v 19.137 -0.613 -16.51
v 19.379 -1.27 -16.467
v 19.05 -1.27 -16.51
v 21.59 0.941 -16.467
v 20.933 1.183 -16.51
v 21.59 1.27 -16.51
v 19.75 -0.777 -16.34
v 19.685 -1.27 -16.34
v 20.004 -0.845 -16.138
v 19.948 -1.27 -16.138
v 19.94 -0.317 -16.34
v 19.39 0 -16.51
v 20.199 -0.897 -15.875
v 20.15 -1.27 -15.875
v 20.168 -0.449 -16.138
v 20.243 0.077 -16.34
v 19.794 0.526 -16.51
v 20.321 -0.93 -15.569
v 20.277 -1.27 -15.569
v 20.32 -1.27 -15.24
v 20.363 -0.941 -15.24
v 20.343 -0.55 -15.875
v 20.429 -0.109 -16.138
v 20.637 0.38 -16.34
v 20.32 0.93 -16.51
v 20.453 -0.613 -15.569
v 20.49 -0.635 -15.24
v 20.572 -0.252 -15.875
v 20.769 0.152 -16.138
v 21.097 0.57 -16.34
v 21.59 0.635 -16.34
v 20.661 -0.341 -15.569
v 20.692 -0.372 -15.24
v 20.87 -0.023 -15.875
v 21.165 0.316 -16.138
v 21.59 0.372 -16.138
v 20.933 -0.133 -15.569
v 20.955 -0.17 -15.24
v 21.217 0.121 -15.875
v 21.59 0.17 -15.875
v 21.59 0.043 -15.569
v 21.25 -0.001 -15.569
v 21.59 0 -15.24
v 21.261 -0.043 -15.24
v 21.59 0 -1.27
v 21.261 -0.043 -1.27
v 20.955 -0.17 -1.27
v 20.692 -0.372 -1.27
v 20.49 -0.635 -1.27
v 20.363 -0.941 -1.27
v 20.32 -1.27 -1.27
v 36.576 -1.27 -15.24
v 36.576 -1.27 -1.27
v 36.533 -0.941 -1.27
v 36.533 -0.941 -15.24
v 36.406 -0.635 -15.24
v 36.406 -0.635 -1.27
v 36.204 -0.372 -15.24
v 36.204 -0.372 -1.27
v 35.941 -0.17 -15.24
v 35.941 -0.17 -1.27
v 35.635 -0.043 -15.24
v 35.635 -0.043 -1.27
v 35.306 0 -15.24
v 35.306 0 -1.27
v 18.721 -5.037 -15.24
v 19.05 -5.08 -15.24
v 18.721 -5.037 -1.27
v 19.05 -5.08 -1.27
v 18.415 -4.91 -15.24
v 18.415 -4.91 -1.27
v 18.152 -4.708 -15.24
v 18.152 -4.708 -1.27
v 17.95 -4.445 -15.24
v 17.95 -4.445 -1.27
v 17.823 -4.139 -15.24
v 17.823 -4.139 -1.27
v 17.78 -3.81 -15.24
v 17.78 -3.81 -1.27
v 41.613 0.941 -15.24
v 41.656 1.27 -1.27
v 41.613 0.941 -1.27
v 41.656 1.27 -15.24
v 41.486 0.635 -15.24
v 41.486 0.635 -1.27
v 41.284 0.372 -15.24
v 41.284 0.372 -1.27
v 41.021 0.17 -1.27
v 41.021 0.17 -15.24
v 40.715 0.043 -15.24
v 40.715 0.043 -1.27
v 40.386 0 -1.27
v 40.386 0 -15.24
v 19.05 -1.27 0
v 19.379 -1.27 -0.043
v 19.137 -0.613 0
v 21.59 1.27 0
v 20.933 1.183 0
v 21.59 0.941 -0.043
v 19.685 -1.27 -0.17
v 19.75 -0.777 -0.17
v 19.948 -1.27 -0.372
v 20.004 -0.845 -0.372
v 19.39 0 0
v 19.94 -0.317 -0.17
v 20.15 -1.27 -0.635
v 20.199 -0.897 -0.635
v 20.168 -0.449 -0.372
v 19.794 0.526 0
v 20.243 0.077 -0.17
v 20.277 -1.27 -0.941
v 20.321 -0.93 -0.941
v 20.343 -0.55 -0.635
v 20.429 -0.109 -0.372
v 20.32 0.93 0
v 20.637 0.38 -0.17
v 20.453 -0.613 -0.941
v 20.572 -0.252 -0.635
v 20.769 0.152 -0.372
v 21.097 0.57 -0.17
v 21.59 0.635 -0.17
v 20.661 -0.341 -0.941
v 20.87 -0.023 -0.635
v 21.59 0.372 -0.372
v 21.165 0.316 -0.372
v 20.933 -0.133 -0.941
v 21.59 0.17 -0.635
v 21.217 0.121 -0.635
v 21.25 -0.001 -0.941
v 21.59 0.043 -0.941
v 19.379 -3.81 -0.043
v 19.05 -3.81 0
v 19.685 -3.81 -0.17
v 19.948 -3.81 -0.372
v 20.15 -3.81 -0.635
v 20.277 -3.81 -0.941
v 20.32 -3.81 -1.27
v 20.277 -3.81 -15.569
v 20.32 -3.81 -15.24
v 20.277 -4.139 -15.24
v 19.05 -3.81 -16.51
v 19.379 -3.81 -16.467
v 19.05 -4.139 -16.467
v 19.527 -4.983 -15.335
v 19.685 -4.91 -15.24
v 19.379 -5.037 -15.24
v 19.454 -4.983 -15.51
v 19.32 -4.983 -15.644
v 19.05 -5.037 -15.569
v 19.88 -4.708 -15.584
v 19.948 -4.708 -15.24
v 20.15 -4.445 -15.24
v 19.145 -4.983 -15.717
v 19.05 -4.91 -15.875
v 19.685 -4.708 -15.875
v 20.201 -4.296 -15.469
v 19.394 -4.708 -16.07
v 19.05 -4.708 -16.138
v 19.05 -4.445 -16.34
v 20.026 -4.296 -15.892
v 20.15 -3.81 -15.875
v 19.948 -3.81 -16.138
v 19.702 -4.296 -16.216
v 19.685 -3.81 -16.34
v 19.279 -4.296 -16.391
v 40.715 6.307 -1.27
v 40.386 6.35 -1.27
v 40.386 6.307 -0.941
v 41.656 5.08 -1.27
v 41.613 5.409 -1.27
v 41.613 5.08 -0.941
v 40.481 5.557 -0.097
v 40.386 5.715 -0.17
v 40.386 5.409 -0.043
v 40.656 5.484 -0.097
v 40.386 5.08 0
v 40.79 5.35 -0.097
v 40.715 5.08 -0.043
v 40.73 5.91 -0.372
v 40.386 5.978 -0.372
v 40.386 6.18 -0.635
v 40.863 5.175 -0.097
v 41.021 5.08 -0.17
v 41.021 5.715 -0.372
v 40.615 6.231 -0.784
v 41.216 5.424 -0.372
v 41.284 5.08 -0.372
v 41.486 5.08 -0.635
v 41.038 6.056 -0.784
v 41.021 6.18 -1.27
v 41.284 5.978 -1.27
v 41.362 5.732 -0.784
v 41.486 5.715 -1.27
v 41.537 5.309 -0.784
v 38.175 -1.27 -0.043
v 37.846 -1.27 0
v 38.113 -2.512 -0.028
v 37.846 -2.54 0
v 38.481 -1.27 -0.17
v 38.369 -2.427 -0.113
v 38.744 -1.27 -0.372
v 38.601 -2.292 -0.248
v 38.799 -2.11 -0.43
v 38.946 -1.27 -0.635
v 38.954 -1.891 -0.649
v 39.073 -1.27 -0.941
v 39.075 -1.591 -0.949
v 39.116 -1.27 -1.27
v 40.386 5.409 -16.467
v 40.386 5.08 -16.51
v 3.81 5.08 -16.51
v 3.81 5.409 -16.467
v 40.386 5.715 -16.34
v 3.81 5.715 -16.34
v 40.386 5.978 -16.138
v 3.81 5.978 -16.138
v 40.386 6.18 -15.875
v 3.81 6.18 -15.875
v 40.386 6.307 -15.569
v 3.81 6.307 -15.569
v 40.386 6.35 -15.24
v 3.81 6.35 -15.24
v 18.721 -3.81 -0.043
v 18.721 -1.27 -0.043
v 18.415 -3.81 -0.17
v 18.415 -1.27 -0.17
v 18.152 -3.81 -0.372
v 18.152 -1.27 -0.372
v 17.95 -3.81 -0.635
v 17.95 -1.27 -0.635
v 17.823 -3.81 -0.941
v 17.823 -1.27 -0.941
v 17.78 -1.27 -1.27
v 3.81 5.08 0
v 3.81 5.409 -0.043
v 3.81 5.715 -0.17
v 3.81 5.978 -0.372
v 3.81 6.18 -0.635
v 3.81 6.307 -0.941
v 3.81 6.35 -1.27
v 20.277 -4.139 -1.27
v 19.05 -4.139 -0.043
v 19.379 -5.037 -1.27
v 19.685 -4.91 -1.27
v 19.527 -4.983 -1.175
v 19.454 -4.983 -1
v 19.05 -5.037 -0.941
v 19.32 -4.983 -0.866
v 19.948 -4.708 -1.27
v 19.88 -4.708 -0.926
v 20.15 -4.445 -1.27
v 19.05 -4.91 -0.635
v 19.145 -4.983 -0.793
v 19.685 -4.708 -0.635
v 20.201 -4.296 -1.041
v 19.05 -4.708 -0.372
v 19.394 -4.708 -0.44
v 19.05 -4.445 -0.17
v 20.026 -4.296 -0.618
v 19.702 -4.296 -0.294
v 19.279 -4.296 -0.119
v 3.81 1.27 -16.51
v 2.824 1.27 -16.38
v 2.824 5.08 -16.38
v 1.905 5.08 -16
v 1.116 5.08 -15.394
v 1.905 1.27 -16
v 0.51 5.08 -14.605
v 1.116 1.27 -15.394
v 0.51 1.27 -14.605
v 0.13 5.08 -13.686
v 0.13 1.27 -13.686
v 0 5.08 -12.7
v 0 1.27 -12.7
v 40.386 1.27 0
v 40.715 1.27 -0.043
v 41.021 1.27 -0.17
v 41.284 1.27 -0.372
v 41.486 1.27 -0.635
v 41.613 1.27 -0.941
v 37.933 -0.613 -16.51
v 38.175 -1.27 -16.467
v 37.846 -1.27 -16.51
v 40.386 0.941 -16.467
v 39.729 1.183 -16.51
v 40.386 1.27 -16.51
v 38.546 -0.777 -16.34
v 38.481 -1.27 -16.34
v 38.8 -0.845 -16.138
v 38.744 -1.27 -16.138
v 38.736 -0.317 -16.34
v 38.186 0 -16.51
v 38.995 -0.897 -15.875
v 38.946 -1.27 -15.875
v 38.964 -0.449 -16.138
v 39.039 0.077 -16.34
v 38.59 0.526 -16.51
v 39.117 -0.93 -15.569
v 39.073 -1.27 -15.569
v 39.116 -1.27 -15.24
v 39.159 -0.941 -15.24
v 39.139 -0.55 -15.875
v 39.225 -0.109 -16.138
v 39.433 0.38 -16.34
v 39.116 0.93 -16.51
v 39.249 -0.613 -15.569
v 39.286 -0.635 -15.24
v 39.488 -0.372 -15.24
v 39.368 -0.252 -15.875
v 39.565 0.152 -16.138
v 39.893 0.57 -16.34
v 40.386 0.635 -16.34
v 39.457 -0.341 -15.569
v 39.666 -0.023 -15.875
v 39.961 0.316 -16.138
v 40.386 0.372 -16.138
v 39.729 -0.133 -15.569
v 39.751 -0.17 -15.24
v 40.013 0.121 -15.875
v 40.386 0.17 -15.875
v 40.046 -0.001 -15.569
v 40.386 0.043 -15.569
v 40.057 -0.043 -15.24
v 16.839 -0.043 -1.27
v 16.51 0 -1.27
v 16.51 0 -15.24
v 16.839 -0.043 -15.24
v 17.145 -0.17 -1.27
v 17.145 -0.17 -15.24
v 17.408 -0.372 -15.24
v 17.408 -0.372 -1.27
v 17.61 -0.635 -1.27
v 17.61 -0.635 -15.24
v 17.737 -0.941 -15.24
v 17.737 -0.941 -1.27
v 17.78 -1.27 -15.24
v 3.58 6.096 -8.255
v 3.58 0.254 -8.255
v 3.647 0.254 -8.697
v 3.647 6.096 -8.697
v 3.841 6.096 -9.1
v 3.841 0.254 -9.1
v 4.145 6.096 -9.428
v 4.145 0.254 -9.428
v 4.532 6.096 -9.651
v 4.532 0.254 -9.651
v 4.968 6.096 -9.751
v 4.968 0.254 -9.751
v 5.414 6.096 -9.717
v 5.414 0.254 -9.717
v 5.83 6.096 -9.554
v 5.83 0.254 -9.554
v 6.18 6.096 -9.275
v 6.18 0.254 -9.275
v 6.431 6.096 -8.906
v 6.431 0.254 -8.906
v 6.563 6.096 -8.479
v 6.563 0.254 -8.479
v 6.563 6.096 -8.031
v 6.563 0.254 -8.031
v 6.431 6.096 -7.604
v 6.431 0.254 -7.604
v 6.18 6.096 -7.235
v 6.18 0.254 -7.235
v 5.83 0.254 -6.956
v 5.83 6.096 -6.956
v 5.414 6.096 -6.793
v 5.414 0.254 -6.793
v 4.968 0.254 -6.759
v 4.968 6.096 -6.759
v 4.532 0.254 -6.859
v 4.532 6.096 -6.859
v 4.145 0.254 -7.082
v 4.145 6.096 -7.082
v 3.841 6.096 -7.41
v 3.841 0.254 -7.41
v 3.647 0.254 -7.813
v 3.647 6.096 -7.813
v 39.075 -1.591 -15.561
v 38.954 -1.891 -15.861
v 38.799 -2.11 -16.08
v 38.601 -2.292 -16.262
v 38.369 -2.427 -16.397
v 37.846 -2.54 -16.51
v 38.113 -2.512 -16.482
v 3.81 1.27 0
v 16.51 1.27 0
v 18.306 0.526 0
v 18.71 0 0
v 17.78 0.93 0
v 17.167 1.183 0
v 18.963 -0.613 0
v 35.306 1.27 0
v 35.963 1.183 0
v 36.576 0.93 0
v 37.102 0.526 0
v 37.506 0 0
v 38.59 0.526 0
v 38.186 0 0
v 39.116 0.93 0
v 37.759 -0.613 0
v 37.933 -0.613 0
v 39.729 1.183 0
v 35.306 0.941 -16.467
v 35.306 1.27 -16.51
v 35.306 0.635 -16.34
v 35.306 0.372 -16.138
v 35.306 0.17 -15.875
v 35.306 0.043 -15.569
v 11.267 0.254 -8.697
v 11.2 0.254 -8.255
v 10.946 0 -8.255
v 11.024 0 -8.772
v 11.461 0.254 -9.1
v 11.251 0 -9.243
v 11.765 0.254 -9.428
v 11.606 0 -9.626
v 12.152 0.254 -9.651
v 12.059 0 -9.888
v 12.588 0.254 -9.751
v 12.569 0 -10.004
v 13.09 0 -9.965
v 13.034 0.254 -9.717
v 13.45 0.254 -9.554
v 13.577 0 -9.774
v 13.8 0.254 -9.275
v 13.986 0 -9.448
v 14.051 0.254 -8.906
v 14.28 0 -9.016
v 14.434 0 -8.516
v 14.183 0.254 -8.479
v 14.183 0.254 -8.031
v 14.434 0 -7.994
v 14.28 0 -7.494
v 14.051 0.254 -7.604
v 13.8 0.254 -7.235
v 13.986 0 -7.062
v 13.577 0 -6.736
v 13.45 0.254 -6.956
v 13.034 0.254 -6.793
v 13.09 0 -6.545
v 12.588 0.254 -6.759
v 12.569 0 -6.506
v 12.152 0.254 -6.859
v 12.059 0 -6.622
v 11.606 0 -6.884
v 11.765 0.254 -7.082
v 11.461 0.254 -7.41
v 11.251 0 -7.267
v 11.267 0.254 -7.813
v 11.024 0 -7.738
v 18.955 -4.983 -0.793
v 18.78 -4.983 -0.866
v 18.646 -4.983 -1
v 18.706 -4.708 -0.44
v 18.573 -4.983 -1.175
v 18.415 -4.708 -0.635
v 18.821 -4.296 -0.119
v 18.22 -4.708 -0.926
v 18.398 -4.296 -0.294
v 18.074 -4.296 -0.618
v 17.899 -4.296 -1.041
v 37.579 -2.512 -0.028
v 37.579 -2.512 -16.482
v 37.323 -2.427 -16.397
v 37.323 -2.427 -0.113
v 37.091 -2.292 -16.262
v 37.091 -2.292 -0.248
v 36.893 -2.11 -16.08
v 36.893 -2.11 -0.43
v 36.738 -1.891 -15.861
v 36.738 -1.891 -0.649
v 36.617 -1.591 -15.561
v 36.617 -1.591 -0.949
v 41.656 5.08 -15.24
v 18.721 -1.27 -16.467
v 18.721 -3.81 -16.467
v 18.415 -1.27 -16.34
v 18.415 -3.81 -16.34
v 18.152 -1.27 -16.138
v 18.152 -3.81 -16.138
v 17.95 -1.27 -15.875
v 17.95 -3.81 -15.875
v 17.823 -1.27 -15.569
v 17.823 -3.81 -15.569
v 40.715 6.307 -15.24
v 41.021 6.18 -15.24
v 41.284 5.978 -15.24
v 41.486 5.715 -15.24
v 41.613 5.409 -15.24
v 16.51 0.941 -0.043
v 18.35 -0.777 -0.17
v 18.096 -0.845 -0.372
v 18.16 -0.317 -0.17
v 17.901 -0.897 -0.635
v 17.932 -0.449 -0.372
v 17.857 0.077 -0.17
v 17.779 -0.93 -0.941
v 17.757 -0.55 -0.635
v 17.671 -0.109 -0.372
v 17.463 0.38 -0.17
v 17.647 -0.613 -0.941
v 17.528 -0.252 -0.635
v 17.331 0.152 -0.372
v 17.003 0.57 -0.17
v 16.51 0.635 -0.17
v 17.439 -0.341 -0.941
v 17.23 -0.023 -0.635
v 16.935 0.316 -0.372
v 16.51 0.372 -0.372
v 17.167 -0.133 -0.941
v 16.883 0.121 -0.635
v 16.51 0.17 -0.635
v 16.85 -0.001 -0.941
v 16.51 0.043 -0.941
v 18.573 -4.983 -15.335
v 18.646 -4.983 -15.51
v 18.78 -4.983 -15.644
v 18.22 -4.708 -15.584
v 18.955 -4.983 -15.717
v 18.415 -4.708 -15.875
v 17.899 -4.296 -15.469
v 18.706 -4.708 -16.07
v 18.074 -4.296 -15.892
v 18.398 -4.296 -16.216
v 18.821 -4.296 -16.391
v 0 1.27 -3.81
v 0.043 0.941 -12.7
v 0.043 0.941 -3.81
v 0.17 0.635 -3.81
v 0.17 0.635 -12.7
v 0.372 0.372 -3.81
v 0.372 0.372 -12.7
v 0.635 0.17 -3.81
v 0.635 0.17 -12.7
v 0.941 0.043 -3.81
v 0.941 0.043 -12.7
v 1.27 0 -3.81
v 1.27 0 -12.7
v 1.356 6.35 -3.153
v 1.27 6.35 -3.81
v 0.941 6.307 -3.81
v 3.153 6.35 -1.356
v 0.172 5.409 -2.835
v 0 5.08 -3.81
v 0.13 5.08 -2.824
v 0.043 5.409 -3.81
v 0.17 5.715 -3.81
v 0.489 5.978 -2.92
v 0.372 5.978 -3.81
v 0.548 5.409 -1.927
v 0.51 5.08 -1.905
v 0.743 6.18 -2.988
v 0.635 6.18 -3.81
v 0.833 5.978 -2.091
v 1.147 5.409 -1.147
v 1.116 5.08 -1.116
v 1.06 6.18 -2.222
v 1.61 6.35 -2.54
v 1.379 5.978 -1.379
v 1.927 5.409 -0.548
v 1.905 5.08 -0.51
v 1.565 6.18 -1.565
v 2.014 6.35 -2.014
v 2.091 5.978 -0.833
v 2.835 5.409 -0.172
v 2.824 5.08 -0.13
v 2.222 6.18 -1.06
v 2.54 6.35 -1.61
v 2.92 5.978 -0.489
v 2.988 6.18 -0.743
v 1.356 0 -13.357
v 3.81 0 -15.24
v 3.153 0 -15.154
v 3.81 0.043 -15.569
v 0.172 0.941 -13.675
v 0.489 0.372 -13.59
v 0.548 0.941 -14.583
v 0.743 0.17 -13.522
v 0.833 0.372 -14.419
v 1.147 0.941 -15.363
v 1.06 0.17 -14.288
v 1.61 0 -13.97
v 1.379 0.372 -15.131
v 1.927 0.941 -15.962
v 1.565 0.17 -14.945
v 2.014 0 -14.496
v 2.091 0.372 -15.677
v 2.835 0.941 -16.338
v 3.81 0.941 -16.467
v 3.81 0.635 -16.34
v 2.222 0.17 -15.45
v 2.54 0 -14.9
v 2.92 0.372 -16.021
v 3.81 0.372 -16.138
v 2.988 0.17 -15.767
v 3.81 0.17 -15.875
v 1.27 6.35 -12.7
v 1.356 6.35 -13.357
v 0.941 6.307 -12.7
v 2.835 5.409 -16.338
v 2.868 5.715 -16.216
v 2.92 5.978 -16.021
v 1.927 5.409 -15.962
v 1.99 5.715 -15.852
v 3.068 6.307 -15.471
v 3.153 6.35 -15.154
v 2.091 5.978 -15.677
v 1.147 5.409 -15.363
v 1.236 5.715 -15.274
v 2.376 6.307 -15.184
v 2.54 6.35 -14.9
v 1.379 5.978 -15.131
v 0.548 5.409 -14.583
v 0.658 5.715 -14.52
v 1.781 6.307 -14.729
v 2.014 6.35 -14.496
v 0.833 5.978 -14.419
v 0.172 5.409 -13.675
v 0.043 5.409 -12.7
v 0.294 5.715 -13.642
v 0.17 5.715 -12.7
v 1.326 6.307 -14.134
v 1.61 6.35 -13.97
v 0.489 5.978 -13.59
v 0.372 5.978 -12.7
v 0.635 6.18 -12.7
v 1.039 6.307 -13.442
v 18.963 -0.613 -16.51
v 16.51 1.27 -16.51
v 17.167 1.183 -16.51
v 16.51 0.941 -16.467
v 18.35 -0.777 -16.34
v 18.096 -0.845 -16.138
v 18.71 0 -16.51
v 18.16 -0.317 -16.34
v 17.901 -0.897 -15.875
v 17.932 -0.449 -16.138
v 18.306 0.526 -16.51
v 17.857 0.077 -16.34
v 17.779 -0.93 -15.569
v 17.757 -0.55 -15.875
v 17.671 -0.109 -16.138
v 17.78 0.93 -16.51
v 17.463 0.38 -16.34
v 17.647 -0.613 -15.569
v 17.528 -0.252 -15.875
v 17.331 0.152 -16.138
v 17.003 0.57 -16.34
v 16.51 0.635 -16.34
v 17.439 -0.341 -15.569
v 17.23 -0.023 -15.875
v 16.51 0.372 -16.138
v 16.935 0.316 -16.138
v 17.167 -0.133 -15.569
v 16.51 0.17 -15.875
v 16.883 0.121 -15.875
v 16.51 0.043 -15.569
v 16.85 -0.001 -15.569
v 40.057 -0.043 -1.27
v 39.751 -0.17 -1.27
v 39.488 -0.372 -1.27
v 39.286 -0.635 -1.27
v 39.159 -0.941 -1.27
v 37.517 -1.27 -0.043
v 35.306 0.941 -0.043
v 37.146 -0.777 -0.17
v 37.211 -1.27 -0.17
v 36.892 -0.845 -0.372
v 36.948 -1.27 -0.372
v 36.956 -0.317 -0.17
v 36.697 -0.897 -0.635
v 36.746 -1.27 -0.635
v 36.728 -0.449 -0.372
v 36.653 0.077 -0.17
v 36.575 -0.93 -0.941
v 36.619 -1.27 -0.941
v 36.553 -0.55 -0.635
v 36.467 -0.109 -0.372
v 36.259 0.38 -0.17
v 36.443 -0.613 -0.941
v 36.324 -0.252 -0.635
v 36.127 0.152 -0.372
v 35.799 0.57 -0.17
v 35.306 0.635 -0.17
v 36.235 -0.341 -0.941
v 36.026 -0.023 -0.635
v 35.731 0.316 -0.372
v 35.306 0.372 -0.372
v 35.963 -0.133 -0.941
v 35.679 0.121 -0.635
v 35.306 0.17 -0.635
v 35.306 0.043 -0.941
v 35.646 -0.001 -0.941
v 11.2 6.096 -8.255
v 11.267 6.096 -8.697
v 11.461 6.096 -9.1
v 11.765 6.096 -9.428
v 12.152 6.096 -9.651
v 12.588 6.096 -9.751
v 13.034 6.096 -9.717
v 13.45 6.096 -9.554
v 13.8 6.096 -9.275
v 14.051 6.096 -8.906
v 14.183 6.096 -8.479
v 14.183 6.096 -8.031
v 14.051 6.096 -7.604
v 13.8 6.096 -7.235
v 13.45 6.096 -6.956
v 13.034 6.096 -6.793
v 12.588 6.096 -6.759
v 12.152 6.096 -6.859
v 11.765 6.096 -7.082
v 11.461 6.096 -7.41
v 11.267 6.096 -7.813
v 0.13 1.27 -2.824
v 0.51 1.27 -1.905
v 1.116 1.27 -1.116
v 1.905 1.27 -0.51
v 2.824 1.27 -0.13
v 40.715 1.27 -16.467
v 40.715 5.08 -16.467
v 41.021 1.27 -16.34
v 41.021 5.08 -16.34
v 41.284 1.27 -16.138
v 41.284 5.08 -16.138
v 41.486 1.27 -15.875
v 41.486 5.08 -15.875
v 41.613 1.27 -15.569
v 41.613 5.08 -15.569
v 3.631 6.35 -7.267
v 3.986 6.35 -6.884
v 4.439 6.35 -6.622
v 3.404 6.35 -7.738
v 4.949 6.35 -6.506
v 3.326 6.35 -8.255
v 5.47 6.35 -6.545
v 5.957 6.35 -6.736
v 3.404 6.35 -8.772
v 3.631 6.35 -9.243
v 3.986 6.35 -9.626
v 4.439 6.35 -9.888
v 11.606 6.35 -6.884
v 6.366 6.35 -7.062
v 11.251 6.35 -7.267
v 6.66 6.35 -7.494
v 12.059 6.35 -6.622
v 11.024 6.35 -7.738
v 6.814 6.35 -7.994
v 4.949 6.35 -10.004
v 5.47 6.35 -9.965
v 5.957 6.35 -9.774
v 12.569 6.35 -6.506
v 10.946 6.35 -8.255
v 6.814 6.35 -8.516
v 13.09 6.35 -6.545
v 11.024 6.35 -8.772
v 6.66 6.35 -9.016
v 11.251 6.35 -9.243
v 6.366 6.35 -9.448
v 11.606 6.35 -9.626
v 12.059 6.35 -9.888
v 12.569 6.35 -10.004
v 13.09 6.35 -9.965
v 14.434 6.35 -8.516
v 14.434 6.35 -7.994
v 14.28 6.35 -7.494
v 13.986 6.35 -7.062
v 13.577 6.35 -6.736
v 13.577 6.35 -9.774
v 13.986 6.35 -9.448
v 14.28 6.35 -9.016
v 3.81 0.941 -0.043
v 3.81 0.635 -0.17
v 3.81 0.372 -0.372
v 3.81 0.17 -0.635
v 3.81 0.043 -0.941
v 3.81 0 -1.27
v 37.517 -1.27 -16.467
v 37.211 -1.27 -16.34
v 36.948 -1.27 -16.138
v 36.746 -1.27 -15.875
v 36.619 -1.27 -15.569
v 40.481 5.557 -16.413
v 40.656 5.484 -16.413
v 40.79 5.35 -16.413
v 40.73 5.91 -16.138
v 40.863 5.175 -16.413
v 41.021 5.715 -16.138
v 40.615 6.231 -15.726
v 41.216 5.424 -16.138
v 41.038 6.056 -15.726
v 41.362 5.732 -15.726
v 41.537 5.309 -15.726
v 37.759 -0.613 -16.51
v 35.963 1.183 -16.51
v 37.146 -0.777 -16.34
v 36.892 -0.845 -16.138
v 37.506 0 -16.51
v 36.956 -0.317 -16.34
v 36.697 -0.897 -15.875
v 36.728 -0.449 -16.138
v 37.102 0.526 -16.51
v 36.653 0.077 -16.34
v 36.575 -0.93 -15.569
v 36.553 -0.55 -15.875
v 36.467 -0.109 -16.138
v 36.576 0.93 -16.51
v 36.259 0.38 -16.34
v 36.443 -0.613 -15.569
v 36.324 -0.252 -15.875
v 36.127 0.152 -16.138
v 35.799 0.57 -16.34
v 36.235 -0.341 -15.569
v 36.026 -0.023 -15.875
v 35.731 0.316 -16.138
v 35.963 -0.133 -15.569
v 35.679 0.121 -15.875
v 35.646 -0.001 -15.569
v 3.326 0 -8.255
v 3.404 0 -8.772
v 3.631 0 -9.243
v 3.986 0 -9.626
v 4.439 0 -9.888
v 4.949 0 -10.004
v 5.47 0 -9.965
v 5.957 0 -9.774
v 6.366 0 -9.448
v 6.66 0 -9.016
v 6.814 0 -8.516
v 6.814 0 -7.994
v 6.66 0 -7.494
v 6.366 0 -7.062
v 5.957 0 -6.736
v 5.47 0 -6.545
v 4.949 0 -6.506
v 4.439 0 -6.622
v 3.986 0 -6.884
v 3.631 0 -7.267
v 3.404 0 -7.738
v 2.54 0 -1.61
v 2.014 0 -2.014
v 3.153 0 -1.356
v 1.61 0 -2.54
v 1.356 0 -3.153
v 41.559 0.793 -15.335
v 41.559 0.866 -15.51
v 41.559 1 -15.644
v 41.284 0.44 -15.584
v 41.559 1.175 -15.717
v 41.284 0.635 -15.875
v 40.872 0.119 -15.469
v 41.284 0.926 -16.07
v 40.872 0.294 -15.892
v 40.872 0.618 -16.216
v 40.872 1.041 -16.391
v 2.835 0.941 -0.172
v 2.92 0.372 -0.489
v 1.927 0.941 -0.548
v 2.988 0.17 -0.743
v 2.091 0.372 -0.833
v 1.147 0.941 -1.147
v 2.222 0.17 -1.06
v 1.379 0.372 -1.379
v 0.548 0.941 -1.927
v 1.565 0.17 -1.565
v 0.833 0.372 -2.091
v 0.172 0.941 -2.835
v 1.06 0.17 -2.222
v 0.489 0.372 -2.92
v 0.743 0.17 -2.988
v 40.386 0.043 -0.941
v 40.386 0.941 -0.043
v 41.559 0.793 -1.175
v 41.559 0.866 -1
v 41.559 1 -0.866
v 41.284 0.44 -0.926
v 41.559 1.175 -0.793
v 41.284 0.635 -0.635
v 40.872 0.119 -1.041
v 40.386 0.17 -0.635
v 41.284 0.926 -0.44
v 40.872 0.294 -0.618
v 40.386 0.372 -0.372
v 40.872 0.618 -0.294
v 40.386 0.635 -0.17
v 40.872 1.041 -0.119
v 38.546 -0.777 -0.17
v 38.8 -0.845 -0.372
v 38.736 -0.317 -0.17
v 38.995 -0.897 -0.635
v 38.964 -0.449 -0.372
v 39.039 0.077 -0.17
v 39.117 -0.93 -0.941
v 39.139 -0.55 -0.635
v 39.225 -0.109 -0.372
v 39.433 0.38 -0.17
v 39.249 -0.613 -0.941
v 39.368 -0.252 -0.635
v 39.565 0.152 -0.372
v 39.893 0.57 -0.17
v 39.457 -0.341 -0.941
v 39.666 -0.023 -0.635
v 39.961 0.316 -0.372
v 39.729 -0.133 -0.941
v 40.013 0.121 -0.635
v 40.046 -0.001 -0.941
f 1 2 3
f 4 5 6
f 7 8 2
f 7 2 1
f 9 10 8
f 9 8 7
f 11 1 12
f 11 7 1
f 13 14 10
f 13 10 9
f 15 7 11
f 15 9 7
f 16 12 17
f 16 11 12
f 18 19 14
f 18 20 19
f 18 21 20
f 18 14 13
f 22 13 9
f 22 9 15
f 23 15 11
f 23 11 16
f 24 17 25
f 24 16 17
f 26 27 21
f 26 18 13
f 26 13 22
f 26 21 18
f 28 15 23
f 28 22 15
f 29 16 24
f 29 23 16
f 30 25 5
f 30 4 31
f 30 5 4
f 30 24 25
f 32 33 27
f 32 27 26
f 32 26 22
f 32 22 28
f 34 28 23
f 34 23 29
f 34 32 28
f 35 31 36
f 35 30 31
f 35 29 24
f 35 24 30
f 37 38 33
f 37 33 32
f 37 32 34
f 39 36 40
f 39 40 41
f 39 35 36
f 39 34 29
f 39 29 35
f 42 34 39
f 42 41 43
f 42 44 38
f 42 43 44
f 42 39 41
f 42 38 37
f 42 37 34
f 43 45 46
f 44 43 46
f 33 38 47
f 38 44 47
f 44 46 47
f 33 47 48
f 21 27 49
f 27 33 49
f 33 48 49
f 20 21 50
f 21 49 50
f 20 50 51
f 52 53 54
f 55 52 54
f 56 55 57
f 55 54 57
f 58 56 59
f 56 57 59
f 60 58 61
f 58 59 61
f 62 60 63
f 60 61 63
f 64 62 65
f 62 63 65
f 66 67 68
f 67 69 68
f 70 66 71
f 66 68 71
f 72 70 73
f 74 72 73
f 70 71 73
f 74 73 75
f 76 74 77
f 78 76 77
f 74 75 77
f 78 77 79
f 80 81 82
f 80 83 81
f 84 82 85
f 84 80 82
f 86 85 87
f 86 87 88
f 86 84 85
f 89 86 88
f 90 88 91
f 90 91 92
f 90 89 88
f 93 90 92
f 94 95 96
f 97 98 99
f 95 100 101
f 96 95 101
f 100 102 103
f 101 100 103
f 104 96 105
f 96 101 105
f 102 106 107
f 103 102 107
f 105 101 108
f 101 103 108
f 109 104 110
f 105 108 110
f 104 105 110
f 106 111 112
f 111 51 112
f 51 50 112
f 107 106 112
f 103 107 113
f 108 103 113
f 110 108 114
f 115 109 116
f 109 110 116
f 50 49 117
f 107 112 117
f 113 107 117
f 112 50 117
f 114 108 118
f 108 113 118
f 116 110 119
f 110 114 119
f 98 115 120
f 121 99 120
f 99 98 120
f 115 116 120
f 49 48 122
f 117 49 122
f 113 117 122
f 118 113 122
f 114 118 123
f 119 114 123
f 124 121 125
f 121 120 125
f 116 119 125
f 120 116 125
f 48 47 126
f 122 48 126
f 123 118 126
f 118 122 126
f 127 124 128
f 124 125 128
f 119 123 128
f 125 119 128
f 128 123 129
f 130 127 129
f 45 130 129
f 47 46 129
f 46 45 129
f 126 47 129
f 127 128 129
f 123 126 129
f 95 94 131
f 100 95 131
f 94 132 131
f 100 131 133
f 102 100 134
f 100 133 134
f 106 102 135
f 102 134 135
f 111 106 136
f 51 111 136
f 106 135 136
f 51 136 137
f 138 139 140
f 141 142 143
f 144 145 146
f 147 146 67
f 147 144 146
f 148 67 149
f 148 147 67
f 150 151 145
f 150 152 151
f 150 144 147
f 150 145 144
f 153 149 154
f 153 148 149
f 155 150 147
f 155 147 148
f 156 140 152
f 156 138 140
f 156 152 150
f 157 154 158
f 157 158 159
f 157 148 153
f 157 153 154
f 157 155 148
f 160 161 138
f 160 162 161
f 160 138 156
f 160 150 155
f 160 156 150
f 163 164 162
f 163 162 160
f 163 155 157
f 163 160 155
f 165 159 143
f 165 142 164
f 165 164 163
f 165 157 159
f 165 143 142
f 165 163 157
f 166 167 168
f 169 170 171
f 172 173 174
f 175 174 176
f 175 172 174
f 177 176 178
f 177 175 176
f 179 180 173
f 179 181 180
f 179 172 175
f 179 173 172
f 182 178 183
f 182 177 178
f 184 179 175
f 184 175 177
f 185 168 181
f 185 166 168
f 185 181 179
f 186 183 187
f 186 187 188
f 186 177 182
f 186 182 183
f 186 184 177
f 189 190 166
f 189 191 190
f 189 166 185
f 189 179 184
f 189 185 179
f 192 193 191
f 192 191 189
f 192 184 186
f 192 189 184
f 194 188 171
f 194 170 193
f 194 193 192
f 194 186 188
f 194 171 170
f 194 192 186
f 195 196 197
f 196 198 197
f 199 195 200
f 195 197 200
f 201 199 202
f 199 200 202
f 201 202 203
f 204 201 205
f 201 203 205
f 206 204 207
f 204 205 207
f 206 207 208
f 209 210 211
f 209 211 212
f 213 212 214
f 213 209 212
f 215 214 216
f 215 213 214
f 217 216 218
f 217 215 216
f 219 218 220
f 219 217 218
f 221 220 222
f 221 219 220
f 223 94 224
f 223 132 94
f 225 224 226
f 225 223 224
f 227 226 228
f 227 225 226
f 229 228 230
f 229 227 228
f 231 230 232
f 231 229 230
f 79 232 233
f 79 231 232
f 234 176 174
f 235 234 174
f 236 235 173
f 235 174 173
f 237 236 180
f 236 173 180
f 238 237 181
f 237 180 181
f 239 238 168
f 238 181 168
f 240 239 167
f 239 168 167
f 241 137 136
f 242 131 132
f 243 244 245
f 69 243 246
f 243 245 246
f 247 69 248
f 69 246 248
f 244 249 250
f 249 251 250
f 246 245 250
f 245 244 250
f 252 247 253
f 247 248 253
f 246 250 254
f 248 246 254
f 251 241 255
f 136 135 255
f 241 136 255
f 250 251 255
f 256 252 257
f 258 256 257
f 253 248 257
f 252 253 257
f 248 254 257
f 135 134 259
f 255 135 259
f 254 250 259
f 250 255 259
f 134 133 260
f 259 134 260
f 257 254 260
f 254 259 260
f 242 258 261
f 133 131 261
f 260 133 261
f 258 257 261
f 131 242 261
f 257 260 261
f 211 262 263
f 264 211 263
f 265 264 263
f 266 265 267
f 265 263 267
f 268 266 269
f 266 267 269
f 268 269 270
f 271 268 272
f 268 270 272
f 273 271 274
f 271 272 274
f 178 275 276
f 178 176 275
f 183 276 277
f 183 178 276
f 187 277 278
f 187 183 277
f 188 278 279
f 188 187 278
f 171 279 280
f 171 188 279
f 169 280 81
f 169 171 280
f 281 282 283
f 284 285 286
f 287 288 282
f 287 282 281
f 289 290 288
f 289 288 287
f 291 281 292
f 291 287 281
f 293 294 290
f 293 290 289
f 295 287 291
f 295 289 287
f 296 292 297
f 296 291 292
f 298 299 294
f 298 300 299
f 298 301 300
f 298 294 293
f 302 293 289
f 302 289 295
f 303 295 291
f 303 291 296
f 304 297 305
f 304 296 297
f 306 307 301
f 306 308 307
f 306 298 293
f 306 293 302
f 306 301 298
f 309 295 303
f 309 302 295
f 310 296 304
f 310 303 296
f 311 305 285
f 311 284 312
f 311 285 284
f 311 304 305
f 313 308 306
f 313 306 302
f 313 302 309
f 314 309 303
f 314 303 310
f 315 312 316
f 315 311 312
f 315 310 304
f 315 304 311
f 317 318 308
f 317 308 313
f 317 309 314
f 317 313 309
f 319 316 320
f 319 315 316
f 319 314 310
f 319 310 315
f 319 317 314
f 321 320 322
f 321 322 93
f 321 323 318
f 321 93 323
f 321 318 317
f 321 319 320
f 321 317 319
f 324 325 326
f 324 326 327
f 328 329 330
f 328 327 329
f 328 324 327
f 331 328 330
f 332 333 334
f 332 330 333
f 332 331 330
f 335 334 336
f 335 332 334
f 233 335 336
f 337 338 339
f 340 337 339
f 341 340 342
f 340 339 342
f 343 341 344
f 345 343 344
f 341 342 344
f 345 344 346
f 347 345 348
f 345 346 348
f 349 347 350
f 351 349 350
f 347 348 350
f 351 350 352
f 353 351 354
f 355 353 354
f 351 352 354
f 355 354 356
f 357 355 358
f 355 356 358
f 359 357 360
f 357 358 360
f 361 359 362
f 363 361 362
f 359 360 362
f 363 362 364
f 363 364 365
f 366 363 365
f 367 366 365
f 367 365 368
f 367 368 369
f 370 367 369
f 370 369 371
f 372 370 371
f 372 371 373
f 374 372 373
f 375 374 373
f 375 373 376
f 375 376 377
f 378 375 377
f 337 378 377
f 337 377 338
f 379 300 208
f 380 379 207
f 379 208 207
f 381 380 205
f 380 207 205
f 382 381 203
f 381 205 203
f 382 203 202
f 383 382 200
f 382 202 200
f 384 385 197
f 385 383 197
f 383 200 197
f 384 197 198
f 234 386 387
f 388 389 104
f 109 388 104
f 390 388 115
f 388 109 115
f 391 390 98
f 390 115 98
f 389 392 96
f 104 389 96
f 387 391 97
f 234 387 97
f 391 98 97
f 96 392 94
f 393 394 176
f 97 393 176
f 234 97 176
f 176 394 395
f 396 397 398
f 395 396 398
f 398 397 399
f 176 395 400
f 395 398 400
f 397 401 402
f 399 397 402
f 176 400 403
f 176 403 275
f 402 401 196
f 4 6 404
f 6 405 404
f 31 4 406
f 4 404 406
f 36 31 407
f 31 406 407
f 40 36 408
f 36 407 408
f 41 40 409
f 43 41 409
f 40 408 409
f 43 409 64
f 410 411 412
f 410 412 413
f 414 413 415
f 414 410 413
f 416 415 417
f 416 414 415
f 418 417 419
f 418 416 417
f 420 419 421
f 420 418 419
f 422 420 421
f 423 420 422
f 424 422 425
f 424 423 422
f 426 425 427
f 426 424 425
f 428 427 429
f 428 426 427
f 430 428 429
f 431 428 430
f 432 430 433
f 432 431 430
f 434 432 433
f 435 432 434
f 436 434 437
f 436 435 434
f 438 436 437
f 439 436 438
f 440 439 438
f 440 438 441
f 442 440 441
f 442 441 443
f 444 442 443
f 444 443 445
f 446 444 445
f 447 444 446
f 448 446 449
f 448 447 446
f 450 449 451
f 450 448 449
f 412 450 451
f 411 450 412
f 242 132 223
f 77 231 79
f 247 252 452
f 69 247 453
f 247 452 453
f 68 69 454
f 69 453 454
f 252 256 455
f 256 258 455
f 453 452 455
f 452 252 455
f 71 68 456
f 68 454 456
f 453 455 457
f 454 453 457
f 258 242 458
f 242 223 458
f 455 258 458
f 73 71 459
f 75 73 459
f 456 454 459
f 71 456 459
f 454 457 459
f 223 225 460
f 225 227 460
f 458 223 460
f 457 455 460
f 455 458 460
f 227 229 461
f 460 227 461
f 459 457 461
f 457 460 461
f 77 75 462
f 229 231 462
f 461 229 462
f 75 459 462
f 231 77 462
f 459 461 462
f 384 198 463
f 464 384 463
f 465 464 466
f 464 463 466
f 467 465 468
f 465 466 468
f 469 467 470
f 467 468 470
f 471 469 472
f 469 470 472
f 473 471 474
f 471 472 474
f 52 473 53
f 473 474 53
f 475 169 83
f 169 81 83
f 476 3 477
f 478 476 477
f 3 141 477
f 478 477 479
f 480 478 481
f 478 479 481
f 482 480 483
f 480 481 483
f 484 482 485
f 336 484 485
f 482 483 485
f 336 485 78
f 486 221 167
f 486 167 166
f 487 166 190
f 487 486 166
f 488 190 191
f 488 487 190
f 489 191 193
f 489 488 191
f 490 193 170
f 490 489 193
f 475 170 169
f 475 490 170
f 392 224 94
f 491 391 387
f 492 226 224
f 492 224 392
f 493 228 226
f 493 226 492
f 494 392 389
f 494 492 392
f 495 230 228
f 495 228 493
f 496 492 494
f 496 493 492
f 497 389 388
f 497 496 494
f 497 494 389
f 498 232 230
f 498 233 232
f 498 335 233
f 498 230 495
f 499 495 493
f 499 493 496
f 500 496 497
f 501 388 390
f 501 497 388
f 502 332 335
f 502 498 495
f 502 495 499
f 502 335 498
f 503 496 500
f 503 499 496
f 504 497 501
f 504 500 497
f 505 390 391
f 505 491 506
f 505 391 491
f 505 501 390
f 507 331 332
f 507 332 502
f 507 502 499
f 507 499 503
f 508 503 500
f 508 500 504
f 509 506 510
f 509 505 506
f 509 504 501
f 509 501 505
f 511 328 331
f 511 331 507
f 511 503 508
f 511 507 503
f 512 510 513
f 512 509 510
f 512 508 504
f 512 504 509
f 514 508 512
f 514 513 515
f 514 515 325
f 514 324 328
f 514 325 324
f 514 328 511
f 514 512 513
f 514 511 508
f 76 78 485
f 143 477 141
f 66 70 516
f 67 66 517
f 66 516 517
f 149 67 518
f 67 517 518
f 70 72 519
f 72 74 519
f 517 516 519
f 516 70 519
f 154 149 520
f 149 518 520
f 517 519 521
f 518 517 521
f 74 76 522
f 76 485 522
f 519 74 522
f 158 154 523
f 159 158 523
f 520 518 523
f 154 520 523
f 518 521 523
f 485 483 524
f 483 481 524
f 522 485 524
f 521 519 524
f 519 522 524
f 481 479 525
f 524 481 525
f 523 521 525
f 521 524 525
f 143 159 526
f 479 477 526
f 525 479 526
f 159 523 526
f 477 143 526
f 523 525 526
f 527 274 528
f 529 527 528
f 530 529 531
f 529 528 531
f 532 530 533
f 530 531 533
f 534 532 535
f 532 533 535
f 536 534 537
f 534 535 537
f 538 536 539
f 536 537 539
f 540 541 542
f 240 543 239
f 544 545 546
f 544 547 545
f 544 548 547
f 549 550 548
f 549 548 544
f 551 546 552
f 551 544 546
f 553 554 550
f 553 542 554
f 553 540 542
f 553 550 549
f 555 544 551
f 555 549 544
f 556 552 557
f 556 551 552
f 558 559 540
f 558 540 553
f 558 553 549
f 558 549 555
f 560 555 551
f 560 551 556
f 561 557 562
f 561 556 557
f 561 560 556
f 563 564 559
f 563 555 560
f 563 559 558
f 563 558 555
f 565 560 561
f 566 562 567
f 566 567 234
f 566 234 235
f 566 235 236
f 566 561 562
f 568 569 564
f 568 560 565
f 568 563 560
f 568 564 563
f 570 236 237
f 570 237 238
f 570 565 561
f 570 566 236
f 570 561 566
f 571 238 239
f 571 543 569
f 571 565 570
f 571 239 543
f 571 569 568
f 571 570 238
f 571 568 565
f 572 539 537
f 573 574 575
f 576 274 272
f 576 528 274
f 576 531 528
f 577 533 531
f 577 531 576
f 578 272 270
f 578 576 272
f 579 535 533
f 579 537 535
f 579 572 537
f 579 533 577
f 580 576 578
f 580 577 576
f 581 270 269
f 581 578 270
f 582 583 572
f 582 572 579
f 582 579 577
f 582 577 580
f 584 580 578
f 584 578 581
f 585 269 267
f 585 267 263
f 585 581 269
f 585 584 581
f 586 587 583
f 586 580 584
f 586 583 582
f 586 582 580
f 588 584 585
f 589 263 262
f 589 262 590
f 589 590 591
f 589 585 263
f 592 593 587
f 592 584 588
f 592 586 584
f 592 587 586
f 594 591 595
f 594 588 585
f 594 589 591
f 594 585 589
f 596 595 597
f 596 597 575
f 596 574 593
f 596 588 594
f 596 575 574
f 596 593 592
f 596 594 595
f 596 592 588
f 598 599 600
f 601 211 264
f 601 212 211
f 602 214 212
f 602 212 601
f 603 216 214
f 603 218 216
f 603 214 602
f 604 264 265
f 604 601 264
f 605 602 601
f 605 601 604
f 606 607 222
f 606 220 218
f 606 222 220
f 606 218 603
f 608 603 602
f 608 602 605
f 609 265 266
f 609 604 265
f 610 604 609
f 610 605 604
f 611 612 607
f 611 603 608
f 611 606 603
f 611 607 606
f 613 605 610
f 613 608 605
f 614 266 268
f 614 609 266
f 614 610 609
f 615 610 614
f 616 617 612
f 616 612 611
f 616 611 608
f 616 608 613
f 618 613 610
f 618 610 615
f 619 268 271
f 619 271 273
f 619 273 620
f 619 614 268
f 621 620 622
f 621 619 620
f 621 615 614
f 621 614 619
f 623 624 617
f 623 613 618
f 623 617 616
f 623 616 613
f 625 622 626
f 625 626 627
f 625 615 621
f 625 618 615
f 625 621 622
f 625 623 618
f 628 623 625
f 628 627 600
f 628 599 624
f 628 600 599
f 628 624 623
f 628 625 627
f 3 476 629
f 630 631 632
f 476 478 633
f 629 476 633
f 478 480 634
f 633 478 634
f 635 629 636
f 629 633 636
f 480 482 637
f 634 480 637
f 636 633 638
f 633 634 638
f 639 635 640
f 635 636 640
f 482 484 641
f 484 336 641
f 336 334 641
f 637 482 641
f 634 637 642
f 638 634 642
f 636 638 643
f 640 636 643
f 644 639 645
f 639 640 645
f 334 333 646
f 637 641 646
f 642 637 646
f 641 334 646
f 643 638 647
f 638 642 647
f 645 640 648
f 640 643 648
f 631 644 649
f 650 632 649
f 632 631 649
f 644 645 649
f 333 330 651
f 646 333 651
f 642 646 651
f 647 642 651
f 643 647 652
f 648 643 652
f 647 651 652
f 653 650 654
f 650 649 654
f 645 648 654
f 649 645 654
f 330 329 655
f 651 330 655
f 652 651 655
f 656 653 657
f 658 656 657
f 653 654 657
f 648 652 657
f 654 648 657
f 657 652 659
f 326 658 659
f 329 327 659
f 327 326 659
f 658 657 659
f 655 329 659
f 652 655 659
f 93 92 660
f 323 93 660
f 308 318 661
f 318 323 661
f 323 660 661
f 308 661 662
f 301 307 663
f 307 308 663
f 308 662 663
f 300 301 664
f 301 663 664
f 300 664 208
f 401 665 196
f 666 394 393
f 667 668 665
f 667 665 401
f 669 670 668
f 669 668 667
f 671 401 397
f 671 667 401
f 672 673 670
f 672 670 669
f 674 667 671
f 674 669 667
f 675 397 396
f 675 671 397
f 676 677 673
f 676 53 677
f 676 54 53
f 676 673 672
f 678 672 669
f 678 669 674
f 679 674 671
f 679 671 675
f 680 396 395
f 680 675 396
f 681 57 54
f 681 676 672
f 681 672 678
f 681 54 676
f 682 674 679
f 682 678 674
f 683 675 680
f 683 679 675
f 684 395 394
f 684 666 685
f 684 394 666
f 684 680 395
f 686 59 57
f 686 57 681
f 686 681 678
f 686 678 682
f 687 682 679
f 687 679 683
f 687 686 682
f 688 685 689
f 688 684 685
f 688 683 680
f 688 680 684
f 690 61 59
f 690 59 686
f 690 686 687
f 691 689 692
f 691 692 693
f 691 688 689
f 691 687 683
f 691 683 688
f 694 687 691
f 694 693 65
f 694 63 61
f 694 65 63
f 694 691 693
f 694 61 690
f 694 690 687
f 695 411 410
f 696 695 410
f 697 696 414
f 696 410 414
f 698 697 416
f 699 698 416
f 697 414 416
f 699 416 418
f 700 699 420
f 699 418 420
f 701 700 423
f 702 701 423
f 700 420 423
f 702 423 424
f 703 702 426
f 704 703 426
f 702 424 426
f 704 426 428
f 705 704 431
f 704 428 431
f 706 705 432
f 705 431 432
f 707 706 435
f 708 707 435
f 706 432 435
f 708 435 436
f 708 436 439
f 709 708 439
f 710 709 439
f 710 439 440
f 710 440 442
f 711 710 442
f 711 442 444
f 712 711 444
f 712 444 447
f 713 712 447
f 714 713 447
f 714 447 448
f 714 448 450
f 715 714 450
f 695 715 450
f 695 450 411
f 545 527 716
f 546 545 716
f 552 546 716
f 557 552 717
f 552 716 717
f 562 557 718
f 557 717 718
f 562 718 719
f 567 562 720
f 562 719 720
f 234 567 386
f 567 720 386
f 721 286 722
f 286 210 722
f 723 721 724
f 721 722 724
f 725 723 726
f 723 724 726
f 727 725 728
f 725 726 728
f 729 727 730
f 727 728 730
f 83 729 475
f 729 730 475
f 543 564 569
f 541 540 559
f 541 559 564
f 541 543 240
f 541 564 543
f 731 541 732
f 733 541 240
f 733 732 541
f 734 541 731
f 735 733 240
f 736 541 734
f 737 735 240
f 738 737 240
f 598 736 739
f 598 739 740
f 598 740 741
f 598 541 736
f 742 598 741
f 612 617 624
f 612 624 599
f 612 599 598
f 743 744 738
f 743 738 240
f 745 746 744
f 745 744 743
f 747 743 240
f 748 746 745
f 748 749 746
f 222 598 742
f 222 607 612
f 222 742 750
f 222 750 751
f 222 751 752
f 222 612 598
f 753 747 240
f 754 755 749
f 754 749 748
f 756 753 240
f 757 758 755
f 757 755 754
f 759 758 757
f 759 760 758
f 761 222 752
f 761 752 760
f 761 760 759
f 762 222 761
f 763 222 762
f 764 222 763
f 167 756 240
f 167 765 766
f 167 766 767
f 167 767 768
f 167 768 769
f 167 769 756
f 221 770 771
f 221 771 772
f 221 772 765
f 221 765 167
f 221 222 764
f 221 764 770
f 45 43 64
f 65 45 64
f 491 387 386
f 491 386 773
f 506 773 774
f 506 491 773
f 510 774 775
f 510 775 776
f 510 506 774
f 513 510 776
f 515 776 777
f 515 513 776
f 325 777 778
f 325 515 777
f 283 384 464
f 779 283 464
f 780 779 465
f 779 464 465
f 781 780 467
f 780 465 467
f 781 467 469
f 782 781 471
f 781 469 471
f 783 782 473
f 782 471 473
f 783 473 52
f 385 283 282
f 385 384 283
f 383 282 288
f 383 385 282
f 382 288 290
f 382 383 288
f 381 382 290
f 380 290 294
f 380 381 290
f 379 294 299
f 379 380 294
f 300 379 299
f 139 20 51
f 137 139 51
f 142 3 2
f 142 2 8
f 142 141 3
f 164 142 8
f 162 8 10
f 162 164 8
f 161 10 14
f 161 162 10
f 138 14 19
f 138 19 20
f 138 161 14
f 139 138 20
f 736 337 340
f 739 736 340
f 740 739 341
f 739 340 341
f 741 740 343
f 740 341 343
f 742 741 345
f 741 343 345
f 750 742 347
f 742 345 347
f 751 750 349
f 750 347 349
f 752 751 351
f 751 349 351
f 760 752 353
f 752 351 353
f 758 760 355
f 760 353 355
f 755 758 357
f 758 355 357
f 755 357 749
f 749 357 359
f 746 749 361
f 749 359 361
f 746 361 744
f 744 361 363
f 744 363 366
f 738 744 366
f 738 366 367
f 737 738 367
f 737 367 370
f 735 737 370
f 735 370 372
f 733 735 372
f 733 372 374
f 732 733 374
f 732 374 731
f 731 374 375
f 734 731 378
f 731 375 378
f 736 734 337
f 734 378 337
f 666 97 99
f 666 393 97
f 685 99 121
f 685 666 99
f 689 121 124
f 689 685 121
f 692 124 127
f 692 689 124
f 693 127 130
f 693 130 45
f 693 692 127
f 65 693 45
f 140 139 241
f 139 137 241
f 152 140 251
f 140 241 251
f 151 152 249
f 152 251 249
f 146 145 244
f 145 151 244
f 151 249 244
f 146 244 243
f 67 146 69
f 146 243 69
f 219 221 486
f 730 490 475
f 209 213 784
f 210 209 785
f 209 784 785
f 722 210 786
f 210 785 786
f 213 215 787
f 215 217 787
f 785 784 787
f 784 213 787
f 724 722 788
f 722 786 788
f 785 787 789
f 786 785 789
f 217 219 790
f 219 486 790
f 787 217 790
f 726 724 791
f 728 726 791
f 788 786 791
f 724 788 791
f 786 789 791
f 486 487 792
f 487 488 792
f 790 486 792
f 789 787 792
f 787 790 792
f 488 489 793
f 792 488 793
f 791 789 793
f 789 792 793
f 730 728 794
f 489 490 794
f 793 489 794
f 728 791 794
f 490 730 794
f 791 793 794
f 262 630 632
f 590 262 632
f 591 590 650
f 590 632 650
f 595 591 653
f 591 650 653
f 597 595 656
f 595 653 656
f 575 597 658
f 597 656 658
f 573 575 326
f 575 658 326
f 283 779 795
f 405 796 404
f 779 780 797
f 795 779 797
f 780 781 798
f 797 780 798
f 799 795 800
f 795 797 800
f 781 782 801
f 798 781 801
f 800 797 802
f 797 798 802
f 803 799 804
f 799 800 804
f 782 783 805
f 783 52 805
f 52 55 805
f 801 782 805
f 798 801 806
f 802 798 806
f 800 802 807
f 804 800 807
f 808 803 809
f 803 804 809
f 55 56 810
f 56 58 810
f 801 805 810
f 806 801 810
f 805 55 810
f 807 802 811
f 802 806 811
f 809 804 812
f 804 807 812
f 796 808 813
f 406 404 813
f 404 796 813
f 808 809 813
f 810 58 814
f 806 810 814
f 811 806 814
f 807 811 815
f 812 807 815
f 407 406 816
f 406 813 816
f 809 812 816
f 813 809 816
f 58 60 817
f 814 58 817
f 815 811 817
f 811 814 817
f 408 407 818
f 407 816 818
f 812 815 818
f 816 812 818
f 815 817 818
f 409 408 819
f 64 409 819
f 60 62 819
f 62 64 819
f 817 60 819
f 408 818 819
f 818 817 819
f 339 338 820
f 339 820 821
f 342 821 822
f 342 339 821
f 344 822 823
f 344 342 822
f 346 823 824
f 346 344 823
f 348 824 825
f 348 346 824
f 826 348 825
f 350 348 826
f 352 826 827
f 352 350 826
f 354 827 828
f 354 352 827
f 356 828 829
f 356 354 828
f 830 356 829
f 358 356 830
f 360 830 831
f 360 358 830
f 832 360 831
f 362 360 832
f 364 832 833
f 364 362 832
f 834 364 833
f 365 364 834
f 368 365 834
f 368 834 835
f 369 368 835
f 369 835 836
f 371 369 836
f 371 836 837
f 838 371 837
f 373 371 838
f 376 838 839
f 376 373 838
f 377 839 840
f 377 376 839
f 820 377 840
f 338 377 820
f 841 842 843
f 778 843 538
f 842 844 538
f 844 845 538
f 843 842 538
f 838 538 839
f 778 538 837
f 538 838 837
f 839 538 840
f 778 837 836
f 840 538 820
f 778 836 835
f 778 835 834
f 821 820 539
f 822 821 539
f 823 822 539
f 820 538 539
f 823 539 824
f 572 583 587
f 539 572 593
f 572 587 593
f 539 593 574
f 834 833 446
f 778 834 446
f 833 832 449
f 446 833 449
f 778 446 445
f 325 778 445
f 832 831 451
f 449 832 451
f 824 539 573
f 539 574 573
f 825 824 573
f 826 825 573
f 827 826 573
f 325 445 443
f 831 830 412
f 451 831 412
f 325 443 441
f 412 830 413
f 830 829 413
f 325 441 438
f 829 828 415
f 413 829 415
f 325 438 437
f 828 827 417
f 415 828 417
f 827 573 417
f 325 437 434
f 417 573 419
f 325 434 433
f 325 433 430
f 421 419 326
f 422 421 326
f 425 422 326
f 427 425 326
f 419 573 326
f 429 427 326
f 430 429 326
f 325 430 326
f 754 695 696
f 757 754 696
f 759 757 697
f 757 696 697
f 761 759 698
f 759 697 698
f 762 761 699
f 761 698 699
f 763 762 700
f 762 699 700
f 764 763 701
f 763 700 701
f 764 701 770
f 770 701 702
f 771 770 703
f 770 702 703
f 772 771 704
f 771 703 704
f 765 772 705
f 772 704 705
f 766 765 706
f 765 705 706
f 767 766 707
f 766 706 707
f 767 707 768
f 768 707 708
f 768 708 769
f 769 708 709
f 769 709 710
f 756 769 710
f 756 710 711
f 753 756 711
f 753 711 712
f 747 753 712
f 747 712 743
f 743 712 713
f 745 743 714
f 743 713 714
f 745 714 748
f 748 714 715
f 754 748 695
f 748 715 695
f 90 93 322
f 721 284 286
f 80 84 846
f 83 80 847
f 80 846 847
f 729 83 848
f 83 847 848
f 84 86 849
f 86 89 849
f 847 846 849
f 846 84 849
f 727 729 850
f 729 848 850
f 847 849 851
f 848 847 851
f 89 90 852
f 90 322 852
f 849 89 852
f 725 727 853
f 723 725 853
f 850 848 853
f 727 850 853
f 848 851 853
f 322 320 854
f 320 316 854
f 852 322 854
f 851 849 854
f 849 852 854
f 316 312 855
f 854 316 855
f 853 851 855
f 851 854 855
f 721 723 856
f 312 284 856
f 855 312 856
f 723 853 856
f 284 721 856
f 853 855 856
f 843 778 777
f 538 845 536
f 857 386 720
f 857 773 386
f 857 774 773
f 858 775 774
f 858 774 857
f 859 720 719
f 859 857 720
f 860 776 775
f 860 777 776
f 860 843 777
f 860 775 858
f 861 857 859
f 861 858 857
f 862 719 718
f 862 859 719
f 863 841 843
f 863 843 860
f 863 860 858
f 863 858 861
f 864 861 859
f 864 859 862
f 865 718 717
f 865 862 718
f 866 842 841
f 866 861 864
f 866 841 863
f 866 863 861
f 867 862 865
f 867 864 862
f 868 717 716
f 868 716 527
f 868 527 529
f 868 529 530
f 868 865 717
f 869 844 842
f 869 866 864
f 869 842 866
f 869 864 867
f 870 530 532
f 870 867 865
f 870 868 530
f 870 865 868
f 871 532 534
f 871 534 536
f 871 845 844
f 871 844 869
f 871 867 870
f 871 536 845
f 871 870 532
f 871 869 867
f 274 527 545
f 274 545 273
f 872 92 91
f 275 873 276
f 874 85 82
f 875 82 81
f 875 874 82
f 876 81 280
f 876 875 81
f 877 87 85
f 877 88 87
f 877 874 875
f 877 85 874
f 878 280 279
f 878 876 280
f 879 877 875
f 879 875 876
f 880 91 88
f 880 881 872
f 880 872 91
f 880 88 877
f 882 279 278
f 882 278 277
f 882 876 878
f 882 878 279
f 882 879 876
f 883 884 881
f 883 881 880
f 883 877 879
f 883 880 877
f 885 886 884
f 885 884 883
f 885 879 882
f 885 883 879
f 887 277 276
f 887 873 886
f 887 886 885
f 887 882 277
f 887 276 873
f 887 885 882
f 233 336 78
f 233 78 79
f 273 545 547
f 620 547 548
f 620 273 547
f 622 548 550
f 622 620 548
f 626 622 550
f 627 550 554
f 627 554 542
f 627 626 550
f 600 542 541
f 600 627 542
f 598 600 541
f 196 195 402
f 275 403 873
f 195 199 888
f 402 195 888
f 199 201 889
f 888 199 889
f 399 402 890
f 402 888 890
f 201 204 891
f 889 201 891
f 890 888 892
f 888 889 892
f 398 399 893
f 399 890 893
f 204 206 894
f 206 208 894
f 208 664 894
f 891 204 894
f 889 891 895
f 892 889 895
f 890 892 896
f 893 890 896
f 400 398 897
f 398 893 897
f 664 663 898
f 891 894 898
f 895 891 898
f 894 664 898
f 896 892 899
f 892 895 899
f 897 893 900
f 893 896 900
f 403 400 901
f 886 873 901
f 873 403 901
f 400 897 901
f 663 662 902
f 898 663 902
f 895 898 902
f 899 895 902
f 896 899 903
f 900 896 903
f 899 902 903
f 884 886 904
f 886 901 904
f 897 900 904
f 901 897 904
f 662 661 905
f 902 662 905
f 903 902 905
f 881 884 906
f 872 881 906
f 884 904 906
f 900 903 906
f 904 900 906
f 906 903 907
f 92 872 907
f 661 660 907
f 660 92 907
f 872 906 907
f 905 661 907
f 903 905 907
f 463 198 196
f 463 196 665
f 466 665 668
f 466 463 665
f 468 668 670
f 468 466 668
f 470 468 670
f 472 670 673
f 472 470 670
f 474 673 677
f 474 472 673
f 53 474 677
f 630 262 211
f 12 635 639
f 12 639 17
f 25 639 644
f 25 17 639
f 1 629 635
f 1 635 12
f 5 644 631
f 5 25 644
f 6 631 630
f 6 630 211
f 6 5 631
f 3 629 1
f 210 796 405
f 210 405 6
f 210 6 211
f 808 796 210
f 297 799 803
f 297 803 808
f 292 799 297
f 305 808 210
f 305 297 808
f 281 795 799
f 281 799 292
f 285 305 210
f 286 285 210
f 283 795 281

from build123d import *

# Parameters (mm, degrees)
SKETCH1_W             = 41.656
SKETCH1_H             = 16.51
BOSS_EXTRUDE1_DEPTH   = 6.35
SKETCH2_W             = 2.54
SKETCH2_H             = 16.51
BOSS_EXTRUDE2_DEPTH   = 2.54
SKETCH3_W             = 2.54
SKETCH3_H             = 16.51
BOSS_EXTRUDE3_DEPTH   = 5.08
F_3_0MM_DOWEL_HOLE1_D = 3
FILLET1_R             = 1.27
CHAMFER1_SIZE         = 0.254
FILLET2_R             = 3.81


# Some blends are built 0.0001 mm under size
with BuildPart() as part:
    # Sketch1 → Boss-Extrude1 (new body)
    with BuildSketch(Plane(origin=(0, 0, 0), x_dir=(1, 0, 0), z_dir=(0, 1, 0))):
        with Locations((20.828, 8.255)):
            Rectangle(SKETCH1_W, SKETCH1_H)
    extrude(amount=BOSS_EXTRUDE1_DEPTH)

    # Sketch2 → Boss-Extrude2 (add)
    with BuildSketch(Plane.XZ):
        with Locations((37.846, -8.255)):
            Rectangle(SKETCH2_W, SKETCH2_H)
    extrude(amount=BOSS_EXTRUDE2_DEPTH)

    # Sketch3 → Boss-Extrude3 (add)
    with BuildSketch(Plane.XZ):
        with Locations((19.05, -8.255)):
            Rectangle(SKETCH3_W, SKETCH3_H)
    extrude(amount=BOSS_EXTRUDE3_DEPTH)

    # Ø3.0mm Dowel Hole1 (through all)
    with Locations(Plane(origin=(0, 6.35, 0), x_dir=(1, 0, 0), z_dir=(0, 1, 0))):
        with Locations((5.08, 8.255), (12.7, 8.255)):
            Hole(F_3_0MM_DOWEL_HOLE1_D / 2)

    # Fillet1
    fillet1_edges = [part.edges().sort_by_distance(p)[0] for p in [
        (41.656, 6.35, -8.255),
        (20.828, 6.35, -16.51),
        (28.448, 0, -16.51),
        (40.386, 0, 0),
        (39.116, 0, -8.255),
        (39.116, -1.27, -16.51),
        (39.116, -1.27, 0),
        (36.576, 0, -8.255),
        (36.576, -1.27, 0),
        (36.576, -1.27, -16.51),
        (39.116, -2.54, -8.255),
        (36.576, -2.54, -8.255),
        (28.448, 0, 0),
        (8.89, 0, -16.51),
        (20.32, 0, -8.255),
        (20.32, -2.54, -16.51),
        (20.32, -2.54, 0),
        (17.78, 0, -8.255),
        (17.78, -2.54, 0),
        (17.78, -2.54, -16.51),
        (20.32, -5.08, -8.255),
        (19.05, -5.08, 0),
        (17.78, -5.08, -8.255),
        (19.05, -5.08, -16.51),
        (0, 6.35, -8.255),
        (40.386, 0, -16.51),
        (41.656, 0, -8.255),
        (8.89, 0, 0),
        (0, 0, -8.255),
        (20.828, 6.35, 0),
        (41.656, 3.175, -16.51),
        (41.656, 3.175, 0),
    ]]
    fillet(fillet1_edges, radius=FILLET1_R - 0.0001)  # a hair under: the kernel refuses the full size

    # Chamfer1
    chamfer1_edges = [part.edges().sort_by_distance(p)[0] for p in [
        (14.2, 0, -8.255),
        (14.2, 6.35, -8.255),
        (6.58, 0, -8.255),
        (6.58, 6.35, -8.255),
    ]]
    chamfer(chamfer1_edges, length=CHAMFER1_SIZE)

    # Fillet2
    # the kernel refuses this fillet: 3.81 mm, written as the material it takes off along each edge
    with BuildSketch(Plane(origin=(3.81, 0, -3.81), x_dir=(0, 0, 1), z_dir=(1, 0, 0))) as fillet2_piece_1:
        with BuildLine():
            CenterArc((2.5401, -1.2699), 1.2699, 0, 90)
            Line((3.81, -1.2699), (3.81, 0))
            Line((3.81, 0), (2.5401, 0))
        make_face()
    revolve(axis=Axis((3.81, 0, -3.81), (0, -1, 0)), revolution_arc=90, mode=Mode.SUBTRACT)
    with BuildSketch(Plane(origin=(3.81, 0, -12.7), x_dir=(-1, 0, 0), z_dir=(0, 0, 1))) as fillet2_piece_2:
        with BuildLine():
            CenterArc((2.5401, -1.2699), 1.2699, 0, 90)
            Line((3.81, -1.2699), (3.81, 0))
            Line((3.81, 0), (2.5401, 0))
        make_face()
    revolve(axis=Axis((3.81, 0, -12.7), (0, -1, 0)), revolution_arc=90, mode=Mode.SUBTRACT)
    with BuildSketch(Plane(origin=(3.81, 6.35, -3.81), x_dir=(-1, 0, 0), z_dir=(0, 0, -1))) as fillet2_piece_3:
        with BuildLine():
            CenterArc((2.5401, -1.2699), 1.2699, 0, 90)
            Line((3.81, -1.2699), (3.81, 0))
            Line((3.81, 0), (2.5401, 0))
        make_face()
    revolve(axis=Axis((3.81, 6.35, -3.81), (0, 1, 0)), revolution_arc=90, mode=Mode.SUBTRACT)
    with BuildSketch(Plane(origin=(3.81, 6.35, -12.7), x_dir=(0, 0, -1), z_dir=(1, 0, 0))) as fillet2_piece_4:
        with BuildLine():
            CenterArc((2.5401, -1.2699), 1.2699, 0, 90)
            Line((3.81, -1.2699), (3.81, 0))
            Line((3.81, 0), (2.5401, 0))
        make_face()
    revolve(axis=Axis((3.81, 6.35, -12.7), (0, 1, 0)), revolution_arc=90, mode=Mode.SUBTRACT)
    with BuildSketch(Plane(origin=(0, 0, -16.51), x_dir=(1, 0, 0), z_dir=(0, 1, 0)), Plane(origin=(0, 0, 0), x_dir=(0, 0, -1), z_dir=(0, 1, 0))) as fillet2_piece_5:
        with BuildLine():
            CenterArc((FILLET2_R, -FILLET2_R), FILLET2_R, 90, 90)
            Line((0, -FILLET2_R), (0, 0))
            Line((0, 0), (FILLET2_R, 0))
        make_face()
    extrude(amount=6.35, mode=Mode.SUBTRACT)


solid = part.part
